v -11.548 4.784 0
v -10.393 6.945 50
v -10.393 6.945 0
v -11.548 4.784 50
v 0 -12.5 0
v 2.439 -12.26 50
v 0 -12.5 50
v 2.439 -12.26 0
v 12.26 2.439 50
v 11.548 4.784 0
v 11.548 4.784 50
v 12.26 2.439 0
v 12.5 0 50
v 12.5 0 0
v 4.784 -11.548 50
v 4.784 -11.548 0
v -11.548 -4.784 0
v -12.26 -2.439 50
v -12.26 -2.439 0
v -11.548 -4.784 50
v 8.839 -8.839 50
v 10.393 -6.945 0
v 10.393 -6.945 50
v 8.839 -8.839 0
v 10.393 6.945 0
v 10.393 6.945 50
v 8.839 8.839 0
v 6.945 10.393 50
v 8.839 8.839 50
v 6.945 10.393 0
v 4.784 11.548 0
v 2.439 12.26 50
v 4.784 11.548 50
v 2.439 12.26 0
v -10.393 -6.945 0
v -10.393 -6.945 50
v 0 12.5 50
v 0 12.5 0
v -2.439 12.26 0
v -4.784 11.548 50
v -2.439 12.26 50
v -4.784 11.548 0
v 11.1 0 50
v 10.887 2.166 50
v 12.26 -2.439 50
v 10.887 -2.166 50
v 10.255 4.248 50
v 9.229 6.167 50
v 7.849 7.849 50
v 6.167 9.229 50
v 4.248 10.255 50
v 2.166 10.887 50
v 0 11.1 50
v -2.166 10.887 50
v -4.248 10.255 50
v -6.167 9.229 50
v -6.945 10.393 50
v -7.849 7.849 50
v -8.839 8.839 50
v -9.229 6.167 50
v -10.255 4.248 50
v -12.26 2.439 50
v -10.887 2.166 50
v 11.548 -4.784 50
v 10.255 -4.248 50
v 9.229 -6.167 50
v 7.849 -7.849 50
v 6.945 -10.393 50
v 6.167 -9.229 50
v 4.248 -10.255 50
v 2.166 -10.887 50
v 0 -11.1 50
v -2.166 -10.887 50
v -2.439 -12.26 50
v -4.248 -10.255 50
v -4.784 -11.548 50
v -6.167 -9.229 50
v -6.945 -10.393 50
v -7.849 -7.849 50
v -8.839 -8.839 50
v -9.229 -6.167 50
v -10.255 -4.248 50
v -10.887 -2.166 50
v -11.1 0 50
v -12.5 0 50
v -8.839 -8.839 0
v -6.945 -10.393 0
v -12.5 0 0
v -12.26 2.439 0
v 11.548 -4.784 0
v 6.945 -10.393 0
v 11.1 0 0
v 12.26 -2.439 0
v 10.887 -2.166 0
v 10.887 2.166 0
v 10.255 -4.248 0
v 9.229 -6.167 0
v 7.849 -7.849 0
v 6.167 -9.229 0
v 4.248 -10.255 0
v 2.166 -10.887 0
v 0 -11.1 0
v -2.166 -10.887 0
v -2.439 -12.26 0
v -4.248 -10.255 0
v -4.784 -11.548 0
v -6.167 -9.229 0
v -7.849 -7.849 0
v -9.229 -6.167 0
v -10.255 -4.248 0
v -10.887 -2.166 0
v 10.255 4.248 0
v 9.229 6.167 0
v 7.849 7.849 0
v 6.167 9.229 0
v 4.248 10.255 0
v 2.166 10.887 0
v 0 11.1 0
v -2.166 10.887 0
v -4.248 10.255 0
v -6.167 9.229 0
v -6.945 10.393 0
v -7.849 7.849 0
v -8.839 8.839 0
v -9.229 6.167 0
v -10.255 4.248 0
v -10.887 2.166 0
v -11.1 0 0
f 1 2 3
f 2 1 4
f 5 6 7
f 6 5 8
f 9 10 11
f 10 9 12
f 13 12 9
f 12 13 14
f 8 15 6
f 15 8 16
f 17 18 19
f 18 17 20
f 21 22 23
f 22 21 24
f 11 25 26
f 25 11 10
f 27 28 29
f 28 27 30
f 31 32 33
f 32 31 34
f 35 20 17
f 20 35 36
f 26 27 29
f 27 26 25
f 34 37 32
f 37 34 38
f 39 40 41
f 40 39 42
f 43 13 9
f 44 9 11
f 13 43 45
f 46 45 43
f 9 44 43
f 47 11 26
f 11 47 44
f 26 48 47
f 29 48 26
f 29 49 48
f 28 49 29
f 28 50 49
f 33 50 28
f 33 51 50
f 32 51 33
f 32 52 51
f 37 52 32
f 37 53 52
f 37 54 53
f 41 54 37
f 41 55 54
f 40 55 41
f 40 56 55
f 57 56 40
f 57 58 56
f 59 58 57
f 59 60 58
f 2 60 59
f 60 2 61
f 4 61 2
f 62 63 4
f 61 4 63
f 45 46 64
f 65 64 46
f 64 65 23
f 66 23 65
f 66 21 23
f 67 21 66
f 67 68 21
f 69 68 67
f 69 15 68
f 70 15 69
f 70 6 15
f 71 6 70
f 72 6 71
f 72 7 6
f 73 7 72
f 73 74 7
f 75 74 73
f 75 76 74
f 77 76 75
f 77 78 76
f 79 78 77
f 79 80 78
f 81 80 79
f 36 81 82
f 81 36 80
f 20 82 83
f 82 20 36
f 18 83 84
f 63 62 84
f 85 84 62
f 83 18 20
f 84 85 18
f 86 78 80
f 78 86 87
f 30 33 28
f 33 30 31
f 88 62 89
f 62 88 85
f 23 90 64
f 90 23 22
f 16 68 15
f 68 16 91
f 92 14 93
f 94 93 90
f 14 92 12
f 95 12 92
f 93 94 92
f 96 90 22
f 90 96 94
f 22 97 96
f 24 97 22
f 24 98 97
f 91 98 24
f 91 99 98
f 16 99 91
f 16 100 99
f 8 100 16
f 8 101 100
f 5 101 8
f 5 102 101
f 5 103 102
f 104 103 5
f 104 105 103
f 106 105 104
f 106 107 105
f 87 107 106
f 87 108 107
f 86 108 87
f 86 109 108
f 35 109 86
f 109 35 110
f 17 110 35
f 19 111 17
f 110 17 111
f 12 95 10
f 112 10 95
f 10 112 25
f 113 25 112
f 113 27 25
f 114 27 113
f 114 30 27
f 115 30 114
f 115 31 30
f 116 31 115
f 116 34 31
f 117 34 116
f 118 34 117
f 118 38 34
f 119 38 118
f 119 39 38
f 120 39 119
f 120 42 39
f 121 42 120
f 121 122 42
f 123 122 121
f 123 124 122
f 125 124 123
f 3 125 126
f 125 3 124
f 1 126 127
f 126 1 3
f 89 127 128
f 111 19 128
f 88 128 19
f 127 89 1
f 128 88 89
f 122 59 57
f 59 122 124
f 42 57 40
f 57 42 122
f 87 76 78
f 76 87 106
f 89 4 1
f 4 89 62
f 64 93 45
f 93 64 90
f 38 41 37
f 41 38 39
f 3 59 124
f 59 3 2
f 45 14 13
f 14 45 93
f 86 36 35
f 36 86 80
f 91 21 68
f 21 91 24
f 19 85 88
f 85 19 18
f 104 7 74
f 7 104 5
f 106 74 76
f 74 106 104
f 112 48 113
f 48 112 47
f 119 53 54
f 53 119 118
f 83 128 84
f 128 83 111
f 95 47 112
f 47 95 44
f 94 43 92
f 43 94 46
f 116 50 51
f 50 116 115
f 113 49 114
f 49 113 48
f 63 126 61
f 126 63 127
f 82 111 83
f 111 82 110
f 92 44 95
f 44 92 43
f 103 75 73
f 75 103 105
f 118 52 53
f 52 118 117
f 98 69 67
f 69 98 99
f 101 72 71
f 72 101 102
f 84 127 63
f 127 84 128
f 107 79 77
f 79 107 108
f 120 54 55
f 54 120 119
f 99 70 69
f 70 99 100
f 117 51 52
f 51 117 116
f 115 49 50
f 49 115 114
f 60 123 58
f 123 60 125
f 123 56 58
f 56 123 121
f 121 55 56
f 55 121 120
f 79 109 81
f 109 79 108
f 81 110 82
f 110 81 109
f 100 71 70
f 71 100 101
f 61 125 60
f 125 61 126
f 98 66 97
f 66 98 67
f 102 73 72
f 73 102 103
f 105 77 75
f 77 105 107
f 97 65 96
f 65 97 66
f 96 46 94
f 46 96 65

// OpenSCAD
$fn = 32;

// ----------------------------------------------------------------------
// Thin tube: 1.4 mm wall
// ----------------------------------------------------------------------

// --- parameters (mm) ---
tube_od = 25;             // outer diameter
tube_h = 50;              // height, Z
wall = 1.4;               // wall thickness

difference() {
  cylinder(h = tube_h, d = tube_od);
  translate([0, 0, -1]) cylinder(h = tube_h + 2, d = tube_od - 2 * wall);
}
